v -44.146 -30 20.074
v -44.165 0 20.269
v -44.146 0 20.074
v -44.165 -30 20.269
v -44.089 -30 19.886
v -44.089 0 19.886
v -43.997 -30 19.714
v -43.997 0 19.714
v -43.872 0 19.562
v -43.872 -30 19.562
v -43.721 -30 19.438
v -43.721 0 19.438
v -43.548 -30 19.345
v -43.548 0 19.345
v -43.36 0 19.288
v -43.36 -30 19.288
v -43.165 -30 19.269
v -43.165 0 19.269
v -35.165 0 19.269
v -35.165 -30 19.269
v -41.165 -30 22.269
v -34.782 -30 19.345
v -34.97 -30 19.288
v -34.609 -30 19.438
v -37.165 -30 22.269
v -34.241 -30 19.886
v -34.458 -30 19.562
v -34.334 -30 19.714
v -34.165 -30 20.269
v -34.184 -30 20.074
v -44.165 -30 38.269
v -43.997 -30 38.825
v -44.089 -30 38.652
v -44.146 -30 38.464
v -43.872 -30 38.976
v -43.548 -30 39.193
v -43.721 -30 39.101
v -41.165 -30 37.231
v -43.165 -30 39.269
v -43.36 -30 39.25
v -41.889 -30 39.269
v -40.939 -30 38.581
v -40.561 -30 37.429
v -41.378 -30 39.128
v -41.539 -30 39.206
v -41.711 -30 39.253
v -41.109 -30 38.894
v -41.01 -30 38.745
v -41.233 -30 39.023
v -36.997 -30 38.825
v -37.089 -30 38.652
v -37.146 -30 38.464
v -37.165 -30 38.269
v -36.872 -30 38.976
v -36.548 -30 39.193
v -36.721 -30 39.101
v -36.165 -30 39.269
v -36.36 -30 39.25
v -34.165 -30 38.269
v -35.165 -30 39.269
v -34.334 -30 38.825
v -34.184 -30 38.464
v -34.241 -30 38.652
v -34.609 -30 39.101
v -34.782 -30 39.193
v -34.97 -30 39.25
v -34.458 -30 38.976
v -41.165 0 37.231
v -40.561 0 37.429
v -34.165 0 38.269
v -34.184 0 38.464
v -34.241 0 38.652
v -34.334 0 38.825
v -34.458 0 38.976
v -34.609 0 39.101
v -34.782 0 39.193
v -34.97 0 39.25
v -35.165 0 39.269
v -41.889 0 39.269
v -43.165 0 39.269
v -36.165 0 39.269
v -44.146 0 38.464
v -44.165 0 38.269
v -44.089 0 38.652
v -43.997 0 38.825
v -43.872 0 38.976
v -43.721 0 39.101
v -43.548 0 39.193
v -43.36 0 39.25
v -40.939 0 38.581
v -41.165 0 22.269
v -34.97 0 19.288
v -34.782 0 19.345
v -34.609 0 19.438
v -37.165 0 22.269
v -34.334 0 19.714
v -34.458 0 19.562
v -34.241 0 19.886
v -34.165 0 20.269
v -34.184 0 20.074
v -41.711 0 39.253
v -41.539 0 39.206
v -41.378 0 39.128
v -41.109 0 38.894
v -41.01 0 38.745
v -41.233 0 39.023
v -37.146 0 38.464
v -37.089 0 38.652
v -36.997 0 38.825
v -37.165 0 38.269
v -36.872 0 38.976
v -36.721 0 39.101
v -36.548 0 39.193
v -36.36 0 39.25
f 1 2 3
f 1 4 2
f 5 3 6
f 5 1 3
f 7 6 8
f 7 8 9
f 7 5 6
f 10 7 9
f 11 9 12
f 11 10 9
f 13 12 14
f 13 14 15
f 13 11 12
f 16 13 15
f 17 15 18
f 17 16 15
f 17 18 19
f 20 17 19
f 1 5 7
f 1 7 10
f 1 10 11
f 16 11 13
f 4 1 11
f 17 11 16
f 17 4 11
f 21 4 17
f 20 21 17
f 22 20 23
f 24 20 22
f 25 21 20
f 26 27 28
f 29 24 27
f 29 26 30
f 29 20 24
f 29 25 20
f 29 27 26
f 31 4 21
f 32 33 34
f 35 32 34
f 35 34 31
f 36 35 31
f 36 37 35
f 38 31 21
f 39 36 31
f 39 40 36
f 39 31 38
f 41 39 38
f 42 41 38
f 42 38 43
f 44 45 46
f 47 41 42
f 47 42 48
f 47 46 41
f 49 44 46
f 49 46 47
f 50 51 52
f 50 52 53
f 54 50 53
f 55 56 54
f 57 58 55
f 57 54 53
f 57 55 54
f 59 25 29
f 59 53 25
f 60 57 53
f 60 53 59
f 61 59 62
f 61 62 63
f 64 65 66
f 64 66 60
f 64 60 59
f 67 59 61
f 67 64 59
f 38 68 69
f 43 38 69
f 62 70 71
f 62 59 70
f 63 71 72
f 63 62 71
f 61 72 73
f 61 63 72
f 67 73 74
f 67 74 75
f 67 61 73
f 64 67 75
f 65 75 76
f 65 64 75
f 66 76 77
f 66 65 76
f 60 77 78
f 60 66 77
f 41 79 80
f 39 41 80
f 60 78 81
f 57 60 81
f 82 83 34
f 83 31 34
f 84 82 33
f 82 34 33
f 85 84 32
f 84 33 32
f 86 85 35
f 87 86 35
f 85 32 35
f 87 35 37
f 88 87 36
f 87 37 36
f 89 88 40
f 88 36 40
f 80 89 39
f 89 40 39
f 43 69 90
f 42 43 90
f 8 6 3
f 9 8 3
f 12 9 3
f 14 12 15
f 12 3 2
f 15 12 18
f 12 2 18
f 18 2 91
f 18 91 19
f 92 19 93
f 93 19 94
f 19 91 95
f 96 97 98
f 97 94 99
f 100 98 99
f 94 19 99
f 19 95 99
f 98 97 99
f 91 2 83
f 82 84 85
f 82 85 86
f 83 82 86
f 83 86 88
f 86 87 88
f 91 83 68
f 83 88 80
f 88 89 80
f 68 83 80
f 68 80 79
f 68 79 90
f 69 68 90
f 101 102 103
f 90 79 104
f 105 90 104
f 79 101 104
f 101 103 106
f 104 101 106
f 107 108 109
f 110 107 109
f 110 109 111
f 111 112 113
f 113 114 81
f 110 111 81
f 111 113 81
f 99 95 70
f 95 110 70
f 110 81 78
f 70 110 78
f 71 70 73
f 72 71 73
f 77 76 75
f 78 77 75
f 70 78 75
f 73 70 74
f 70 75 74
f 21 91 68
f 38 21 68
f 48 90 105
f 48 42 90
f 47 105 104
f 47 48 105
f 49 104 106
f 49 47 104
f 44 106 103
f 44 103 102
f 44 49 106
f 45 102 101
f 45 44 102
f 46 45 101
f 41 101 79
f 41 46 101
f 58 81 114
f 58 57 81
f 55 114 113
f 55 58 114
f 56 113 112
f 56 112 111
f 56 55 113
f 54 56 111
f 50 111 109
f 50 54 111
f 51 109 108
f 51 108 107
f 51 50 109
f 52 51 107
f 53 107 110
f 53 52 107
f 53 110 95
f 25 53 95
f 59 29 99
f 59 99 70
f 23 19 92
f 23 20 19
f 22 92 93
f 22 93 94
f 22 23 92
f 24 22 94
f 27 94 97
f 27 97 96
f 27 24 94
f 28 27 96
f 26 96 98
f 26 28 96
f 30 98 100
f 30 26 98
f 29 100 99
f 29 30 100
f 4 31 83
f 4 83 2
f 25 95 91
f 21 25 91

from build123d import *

# Parameters (mm, degrees)
F1_DEPTH = 30
F2_R     = 1


with BuildPart() as f1:
    # F0 (on Front) → F1 (new body)
    with BuildSketch(Plane.XZ):
        Polygon((-44.165032, 39.269094), (-44.165032, 19.269094), (-34.165032, 19.269094), (-34.165032, 39.269094), (-37.165032, 39.269094), (-37.165032, 22.269094), (-41.165032, 22.269094), (-41.165032, 37.231111), (-40.561296, 37.429221), (-41.165032, 39.269094), align=None)
    extrude(amount=F1_DEPTH)

    # F2
    f2_edges = [f1.edges().sort_by_distance(p)[0] for p in [
        (-34.165032, -15, 19.269094),
        (-34.165032, -15, 39.269094),
        (-37.165032, -15, 39.269094),
        (-44.165032, -15, 19.269094),
        (-44.165032, -15, 39.269094),
        (-41.165032, -15, 39.269094),
    ]]
    fillet(f2_edges, radius=F2_R)


solid = f1.part
